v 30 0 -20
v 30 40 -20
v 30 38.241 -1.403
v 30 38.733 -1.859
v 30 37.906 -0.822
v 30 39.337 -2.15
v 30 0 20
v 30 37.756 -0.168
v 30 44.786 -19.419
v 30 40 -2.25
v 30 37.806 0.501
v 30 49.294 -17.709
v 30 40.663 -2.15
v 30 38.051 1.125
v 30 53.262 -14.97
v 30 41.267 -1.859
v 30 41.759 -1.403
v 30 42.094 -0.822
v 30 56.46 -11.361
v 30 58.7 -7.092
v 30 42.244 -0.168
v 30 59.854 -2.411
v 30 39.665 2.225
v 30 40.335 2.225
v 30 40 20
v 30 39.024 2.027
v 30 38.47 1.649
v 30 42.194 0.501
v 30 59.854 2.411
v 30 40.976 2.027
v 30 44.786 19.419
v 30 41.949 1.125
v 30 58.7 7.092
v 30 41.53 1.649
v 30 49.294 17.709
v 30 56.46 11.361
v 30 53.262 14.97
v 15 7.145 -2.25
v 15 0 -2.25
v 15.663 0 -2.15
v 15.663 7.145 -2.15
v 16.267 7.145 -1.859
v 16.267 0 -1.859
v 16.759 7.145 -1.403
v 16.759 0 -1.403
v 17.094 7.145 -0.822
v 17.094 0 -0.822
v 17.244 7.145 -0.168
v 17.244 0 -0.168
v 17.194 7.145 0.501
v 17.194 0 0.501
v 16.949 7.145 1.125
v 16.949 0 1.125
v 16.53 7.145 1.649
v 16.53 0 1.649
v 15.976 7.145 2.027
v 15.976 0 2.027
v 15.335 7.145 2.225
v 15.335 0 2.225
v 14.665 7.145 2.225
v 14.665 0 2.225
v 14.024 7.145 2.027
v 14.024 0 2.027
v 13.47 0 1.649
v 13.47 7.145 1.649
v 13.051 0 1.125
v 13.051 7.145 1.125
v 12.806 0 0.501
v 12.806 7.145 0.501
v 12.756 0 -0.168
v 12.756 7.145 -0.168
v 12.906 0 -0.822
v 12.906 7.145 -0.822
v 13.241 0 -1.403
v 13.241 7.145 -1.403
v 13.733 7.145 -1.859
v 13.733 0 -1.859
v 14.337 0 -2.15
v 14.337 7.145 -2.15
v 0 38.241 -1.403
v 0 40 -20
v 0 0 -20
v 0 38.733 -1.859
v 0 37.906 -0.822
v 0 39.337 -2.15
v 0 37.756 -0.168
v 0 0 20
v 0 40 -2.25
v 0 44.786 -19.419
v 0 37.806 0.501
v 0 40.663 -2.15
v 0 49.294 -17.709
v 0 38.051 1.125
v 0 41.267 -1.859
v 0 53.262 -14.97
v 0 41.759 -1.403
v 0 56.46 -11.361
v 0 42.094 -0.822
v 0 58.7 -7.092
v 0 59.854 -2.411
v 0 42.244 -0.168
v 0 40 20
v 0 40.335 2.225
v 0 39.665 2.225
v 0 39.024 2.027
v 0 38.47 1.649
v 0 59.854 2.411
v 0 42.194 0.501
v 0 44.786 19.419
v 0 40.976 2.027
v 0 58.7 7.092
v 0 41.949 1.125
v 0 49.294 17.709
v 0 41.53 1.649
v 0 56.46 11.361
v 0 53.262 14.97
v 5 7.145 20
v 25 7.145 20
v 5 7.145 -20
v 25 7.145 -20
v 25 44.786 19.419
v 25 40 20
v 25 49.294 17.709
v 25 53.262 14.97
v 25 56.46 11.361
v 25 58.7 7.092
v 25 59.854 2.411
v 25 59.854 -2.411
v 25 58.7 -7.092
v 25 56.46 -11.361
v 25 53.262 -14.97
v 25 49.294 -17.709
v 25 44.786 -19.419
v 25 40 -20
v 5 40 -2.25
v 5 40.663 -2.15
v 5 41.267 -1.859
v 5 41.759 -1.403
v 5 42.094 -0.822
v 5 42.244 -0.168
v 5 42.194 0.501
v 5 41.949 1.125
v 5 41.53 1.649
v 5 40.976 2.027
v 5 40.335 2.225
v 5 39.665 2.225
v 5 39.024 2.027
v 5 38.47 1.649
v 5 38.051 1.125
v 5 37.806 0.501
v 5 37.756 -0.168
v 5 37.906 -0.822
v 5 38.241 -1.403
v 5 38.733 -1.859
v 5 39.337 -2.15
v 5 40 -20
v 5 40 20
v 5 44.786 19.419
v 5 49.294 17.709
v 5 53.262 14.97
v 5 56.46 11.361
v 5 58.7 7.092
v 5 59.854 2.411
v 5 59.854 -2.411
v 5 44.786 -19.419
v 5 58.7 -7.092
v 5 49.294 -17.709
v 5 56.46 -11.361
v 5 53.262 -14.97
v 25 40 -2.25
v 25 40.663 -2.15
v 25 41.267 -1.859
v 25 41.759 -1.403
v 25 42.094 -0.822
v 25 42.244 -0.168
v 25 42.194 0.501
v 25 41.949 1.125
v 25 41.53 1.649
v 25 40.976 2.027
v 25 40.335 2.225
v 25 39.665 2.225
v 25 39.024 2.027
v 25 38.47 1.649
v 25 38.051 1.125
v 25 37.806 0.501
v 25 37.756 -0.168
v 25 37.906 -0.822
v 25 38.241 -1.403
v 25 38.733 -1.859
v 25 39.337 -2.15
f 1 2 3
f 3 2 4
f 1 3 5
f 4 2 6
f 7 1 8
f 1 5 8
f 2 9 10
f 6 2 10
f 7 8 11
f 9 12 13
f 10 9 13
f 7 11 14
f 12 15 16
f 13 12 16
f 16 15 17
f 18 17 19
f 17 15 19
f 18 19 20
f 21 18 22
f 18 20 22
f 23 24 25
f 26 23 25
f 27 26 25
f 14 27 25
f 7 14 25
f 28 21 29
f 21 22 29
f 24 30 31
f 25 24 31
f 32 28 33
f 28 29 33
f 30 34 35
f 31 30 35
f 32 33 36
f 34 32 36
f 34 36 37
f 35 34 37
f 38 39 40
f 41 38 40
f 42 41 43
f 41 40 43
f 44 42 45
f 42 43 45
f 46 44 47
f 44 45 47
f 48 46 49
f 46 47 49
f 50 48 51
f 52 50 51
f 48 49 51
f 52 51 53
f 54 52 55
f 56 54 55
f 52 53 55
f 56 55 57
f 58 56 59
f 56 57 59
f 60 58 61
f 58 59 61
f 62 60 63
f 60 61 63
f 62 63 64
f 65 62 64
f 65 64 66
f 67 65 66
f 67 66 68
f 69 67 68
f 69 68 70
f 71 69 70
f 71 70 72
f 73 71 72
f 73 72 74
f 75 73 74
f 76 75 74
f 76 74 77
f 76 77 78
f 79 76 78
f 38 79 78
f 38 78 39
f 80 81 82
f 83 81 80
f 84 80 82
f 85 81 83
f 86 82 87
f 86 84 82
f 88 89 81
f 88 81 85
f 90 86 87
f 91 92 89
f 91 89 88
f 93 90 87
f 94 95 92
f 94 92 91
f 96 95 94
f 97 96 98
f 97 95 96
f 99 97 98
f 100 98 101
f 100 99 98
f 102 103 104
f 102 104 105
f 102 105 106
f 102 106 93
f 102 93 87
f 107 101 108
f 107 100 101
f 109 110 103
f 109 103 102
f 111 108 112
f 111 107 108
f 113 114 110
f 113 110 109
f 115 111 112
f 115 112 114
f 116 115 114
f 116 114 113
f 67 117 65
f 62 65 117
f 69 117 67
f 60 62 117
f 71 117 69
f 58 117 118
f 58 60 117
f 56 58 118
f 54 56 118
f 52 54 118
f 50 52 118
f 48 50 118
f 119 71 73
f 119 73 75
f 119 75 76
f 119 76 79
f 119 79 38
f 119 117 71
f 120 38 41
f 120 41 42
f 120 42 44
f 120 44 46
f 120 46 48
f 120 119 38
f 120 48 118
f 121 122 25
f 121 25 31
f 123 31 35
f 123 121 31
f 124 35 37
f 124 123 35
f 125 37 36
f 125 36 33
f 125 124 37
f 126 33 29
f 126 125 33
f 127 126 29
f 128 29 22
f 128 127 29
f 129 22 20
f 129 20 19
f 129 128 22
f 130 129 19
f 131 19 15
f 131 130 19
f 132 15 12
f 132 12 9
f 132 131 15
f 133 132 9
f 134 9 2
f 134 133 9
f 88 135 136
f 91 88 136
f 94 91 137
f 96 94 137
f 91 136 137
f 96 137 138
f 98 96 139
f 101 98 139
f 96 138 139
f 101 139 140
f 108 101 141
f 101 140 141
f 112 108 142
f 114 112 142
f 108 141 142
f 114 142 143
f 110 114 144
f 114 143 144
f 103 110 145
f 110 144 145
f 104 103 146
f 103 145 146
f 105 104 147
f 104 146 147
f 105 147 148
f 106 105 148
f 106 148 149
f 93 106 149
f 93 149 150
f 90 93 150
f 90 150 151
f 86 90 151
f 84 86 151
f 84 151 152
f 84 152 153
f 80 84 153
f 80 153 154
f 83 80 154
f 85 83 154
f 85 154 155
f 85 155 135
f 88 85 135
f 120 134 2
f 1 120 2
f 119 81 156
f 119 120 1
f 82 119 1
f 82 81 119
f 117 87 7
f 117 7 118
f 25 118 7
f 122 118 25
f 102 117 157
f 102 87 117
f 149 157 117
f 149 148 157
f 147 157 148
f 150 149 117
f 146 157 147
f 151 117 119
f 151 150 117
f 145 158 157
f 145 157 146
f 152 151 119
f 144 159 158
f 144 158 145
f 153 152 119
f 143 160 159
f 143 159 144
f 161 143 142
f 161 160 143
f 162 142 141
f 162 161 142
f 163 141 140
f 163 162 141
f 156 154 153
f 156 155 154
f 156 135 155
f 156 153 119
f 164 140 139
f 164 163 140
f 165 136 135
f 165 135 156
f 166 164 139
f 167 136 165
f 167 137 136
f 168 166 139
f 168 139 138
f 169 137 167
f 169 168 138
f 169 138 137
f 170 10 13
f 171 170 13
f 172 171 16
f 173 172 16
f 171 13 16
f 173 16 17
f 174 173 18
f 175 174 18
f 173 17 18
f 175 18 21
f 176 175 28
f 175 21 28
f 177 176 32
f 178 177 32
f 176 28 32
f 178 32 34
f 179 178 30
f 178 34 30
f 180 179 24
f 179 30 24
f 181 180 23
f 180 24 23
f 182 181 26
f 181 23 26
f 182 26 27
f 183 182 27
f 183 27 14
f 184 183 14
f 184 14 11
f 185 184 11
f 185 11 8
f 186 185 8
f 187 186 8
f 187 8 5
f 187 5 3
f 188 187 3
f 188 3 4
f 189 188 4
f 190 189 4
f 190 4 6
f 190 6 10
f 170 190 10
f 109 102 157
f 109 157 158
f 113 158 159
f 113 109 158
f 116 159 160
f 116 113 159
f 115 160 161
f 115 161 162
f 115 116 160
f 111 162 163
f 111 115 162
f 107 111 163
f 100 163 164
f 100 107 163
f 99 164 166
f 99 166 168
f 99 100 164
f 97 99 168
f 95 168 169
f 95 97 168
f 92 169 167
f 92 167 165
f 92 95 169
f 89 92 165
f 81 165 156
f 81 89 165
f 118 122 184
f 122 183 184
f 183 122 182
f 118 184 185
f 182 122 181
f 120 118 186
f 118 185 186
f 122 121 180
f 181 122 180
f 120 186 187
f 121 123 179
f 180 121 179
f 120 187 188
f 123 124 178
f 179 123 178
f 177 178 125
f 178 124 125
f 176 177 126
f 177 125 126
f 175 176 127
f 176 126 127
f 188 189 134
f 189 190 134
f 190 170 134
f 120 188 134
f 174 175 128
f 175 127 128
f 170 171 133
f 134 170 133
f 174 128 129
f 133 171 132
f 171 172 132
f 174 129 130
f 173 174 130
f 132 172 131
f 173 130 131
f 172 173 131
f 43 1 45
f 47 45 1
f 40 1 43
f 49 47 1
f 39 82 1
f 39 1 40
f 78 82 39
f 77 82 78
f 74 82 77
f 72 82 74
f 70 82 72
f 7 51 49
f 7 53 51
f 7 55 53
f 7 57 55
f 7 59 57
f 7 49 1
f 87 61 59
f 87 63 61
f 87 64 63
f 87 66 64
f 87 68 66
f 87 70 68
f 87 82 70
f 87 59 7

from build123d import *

# Parameters (mm, degrees)
BOSS_EXTRUDE1_DEPTH = 30
SKETCH2_W           = 20
SKETCH2_H           = 200
CUT_EXTRUDE1_DEPTH  = 260
SKETCH3_R           = 2.25
CUT_EXTRUDE2_DEPTH  = 71
SKETCH5_R           = 2.25
CUT_EXTRUDE3_DEPTH  = 71


with BuildPart() as part:
    # Sketch1 → Boss-Extrude1 (new body)
    with BuildSketch(Plane(origin=(0, 0, 0), x_dir=(0, 0, -1), z_dir=(1, 0, 0))):
        with BuildLine():
            Line((20, 0), (-20, 0))
            Line((-20, 0), (-20, 40))
            ThreePointArc((-20, 40), (0, 60), (20, 40))
            Line((20, 40), (20, 0))
        make_face()
    extrude(amount=BOSS_EXTRUDE1_DEPTH)

    # Sketch2 → Cut-Extrude1 (cut)
    with BuildSketch(Plane(origin=(0, 267.144833217, 0), x_dir=(1, 0, 0), z_dir=(0, 1, 0))):
        with Locations((15, 0)):
            Rectangle(SKETCH2_W, SKETCH2_H)
    extrude(amount=-CUT_EXTRUDE1_DEPTH, mode=Mode.SUBTRACT)

    # Sketch3 → Cut-Extrude2 (cut, through all)
    with BuildSketch(Plane.XZ):
        with Locations(Location((15, 0, 0), (0, 0, 270))):
            Circle(SKETCH3_R)
    extrude(amount=-CUT_EXTRUDE2_DEPTH, mode=Mode.SUBTRACT)

    # Sketch5 → Cut-Extrude3 (cut, through all)
    with BuildSketch(Plane(origin=(30, 0, 0), x_dir=(0, 0, -1), z_dir=(1, 0, 0))):
        with Locations((0, 40)):
            Circle(SKETCH5_R)
    extrude(amount=-CUT_EXTRUDE3_DEPTH, mode=Mode.SUBTRACT)


solid = part.part
